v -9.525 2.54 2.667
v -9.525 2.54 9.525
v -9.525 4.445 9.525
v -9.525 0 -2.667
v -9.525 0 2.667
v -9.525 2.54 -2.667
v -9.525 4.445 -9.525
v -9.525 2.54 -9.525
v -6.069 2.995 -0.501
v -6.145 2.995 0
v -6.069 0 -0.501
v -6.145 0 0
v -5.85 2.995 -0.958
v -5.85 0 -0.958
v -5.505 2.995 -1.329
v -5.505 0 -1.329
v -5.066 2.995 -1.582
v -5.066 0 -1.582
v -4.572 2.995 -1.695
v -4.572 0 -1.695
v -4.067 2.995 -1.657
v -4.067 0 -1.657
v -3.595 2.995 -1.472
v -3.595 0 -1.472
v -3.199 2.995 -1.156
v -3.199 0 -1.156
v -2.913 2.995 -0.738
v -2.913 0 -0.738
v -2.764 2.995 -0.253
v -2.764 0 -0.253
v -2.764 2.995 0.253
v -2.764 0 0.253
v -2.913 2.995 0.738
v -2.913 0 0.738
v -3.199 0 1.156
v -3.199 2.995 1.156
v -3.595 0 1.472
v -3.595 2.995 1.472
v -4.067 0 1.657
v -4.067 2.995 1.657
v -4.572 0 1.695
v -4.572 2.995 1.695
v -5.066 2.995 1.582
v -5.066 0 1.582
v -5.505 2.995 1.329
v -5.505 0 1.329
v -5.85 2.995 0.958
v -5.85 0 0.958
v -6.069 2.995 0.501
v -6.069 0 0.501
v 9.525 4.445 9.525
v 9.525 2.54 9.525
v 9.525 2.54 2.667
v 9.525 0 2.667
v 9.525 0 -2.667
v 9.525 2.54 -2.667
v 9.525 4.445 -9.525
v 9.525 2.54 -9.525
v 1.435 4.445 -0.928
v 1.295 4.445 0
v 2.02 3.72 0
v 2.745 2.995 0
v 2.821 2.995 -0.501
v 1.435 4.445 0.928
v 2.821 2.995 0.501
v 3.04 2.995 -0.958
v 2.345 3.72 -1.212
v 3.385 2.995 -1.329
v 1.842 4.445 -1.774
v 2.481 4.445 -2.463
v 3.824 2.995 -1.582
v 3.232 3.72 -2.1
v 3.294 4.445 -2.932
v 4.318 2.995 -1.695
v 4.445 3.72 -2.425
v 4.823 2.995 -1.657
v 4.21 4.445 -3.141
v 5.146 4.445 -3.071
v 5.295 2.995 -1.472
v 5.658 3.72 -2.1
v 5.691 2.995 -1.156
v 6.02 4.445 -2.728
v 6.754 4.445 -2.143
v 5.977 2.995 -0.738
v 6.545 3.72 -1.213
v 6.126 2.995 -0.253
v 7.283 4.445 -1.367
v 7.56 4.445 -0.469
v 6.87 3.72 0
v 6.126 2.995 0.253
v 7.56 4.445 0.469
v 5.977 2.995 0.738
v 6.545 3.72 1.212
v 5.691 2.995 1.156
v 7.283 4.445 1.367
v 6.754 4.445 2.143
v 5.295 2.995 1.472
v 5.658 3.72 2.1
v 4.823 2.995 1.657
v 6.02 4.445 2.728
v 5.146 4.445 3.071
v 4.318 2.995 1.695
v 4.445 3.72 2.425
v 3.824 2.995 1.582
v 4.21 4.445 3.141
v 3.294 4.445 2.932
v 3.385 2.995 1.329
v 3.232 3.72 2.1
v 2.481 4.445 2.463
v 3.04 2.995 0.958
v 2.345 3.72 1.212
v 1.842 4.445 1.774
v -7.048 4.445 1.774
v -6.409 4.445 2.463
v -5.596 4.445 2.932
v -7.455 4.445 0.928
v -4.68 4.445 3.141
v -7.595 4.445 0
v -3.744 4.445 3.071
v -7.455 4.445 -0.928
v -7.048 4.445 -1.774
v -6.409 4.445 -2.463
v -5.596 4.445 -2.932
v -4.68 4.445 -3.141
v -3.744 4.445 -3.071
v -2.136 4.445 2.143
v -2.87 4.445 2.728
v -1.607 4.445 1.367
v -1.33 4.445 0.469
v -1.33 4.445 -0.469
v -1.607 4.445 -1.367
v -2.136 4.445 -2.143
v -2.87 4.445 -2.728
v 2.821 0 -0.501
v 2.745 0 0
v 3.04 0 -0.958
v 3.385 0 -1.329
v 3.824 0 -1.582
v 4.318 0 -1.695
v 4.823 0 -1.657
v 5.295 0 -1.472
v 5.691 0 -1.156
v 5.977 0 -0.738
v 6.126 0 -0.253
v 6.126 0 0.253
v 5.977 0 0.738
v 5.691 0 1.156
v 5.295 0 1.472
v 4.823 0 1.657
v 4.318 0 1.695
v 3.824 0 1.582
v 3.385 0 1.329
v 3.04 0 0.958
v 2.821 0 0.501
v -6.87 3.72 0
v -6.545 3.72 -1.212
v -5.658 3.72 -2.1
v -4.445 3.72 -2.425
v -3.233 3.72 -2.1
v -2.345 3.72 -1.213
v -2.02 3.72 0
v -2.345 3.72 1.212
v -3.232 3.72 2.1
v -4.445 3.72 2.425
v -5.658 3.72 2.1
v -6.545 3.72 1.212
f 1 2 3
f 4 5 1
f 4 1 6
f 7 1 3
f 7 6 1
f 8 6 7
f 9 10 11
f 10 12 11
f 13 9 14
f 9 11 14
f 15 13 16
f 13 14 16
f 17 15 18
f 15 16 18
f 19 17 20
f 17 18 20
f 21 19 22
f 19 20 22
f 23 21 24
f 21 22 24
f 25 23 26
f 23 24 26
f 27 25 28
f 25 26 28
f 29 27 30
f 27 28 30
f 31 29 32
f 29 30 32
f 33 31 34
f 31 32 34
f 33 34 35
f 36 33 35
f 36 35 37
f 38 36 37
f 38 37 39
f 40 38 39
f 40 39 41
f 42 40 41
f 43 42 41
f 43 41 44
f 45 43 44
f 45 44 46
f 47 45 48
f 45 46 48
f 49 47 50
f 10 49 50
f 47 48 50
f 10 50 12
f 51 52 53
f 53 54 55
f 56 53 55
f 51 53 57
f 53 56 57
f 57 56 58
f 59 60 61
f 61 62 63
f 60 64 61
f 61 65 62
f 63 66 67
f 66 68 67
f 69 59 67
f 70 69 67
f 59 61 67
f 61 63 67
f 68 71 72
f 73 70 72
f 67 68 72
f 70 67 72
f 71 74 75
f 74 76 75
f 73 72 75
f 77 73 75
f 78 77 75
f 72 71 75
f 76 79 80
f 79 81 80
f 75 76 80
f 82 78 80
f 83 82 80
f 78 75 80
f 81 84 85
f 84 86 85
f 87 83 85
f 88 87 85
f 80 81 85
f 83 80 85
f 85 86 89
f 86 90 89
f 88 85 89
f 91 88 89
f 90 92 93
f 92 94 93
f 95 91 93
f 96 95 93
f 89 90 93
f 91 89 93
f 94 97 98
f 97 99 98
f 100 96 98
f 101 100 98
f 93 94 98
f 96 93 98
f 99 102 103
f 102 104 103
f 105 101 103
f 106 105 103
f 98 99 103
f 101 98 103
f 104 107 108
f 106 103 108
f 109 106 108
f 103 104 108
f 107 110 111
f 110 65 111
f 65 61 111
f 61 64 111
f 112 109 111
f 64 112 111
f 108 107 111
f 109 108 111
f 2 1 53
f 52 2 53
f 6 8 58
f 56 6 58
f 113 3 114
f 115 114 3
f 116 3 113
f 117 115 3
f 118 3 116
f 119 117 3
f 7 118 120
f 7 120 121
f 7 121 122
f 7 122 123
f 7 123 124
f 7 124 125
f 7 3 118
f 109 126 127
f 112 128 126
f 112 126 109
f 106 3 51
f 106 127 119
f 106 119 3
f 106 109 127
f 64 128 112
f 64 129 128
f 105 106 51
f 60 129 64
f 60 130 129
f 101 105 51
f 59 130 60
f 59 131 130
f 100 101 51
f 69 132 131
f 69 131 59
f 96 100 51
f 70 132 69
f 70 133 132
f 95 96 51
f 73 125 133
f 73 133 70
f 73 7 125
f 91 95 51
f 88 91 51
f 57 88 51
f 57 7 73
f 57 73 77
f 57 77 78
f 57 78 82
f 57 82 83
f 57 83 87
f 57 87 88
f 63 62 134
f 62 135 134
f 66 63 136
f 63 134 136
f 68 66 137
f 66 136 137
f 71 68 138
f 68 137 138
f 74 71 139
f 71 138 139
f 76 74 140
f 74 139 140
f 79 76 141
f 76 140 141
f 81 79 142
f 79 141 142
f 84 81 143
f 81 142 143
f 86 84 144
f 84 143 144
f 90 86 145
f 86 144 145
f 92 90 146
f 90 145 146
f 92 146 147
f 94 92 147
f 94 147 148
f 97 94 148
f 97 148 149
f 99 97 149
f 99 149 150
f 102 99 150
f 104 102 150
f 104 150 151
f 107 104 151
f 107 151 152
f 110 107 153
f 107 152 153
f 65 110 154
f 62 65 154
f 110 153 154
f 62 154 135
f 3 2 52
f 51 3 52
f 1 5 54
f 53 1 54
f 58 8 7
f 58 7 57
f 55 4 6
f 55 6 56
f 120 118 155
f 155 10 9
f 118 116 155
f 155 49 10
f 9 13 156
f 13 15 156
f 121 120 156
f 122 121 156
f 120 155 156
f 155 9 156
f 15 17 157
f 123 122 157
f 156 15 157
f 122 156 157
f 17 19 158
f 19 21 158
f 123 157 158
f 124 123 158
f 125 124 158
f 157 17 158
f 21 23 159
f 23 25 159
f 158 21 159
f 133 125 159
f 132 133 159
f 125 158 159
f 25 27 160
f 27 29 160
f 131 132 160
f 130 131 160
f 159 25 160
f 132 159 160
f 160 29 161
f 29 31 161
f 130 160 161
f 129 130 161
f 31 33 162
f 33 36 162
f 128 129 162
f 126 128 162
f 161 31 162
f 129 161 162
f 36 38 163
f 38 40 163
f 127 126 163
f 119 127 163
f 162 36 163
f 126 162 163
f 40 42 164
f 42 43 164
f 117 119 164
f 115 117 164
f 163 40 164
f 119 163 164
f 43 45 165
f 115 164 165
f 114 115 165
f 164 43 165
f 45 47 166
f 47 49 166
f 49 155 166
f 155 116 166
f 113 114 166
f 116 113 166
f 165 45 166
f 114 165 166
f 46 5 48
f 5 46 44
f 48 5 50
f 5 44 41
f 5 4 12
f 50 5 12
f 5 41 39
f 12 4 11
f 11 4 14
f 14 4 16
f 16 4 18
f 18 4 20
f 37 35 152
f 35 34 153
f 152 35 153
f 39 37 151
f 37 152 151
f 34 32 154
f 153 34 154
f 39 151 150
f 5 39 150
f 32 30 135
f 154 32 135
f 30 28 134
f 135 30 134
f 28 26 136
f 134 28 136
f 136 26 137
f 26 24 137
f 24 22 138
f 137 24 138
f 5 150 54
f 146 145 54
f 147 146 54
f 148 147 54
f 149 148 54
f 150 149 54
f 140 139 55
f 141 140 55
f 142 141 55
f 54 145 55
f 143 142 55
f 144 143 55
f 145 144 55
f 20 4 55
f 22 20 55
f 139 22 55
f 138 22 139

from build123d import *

# Parameters (mm, degrees)
SKETCH1_W                                       = 19.05
SKETCH1_H                                       = 5.334
BOSS_EXTRUDE1_DEPTH                             = 2.54
SKETCH2_W                                       = 19.05
SKETCH2_H                                       = 19.05
BOSS_EXTRUDE2_DEPTH                             = 1.905
CSK_FOR_M3_FLAT_HEAD_MACHINE_SCREW1_D           = 3.4
CSK_FOR_M3_FLAT_HEAD_MACHINE_SCREW1_CSINK_D     = 6.3
CSK_FOR_M3_FLAT_HEAD_MACHINE_SCREW1_CSINK_ANGLE = 90


with BuildPart() as part:
    # Sketch1 → Boss-Extrude1 (new body)
    with BuildSketch(Plane(origin=(0, 0, 0), x_dir=(1, 0, 0), z_dir=(0, 1, 0))):
        Rectangle(SKETCH1_W, SKETCH1_H)
    extrude(amount=BOSS_EXTRUDE1_DEPTH)

    # Sketch2 → Boss-Extrude2 (add)
    with BuildSketch(Plane(origin=(0, 2.54, 0), x_dir=(1, 0, 0), z_dir=(0, 1, 0))):
        Rectangle(SKETCH2_W, SKETCH2_H)
    extrude(amount=BOSS_EXTRUDE2_DEPTH)

    # CSK for M3 Flat Head Machine Screw1 (through all)
    with Locations(Plane(origin=(0, 4.445, 0), x_dir=(1, 0, 0), z_dir=(0, 1, 0))):
        with Locations((-4.445, 0), (4.445, 0)):
            CounterSinkHole(CSK_FOR_M3_FLAT_HEAD_MACHINE_SCREW1_D / 2, CSK_FOR_M3_FLAT_HEAD_MACHINE_SCREW1_CSINK_D / 2, counter_sink_angle=CSK_FOR_M3_FLAT_HEAD_MACHINE_SCREW1_CSINK_ANGLE)


solid = part.part
